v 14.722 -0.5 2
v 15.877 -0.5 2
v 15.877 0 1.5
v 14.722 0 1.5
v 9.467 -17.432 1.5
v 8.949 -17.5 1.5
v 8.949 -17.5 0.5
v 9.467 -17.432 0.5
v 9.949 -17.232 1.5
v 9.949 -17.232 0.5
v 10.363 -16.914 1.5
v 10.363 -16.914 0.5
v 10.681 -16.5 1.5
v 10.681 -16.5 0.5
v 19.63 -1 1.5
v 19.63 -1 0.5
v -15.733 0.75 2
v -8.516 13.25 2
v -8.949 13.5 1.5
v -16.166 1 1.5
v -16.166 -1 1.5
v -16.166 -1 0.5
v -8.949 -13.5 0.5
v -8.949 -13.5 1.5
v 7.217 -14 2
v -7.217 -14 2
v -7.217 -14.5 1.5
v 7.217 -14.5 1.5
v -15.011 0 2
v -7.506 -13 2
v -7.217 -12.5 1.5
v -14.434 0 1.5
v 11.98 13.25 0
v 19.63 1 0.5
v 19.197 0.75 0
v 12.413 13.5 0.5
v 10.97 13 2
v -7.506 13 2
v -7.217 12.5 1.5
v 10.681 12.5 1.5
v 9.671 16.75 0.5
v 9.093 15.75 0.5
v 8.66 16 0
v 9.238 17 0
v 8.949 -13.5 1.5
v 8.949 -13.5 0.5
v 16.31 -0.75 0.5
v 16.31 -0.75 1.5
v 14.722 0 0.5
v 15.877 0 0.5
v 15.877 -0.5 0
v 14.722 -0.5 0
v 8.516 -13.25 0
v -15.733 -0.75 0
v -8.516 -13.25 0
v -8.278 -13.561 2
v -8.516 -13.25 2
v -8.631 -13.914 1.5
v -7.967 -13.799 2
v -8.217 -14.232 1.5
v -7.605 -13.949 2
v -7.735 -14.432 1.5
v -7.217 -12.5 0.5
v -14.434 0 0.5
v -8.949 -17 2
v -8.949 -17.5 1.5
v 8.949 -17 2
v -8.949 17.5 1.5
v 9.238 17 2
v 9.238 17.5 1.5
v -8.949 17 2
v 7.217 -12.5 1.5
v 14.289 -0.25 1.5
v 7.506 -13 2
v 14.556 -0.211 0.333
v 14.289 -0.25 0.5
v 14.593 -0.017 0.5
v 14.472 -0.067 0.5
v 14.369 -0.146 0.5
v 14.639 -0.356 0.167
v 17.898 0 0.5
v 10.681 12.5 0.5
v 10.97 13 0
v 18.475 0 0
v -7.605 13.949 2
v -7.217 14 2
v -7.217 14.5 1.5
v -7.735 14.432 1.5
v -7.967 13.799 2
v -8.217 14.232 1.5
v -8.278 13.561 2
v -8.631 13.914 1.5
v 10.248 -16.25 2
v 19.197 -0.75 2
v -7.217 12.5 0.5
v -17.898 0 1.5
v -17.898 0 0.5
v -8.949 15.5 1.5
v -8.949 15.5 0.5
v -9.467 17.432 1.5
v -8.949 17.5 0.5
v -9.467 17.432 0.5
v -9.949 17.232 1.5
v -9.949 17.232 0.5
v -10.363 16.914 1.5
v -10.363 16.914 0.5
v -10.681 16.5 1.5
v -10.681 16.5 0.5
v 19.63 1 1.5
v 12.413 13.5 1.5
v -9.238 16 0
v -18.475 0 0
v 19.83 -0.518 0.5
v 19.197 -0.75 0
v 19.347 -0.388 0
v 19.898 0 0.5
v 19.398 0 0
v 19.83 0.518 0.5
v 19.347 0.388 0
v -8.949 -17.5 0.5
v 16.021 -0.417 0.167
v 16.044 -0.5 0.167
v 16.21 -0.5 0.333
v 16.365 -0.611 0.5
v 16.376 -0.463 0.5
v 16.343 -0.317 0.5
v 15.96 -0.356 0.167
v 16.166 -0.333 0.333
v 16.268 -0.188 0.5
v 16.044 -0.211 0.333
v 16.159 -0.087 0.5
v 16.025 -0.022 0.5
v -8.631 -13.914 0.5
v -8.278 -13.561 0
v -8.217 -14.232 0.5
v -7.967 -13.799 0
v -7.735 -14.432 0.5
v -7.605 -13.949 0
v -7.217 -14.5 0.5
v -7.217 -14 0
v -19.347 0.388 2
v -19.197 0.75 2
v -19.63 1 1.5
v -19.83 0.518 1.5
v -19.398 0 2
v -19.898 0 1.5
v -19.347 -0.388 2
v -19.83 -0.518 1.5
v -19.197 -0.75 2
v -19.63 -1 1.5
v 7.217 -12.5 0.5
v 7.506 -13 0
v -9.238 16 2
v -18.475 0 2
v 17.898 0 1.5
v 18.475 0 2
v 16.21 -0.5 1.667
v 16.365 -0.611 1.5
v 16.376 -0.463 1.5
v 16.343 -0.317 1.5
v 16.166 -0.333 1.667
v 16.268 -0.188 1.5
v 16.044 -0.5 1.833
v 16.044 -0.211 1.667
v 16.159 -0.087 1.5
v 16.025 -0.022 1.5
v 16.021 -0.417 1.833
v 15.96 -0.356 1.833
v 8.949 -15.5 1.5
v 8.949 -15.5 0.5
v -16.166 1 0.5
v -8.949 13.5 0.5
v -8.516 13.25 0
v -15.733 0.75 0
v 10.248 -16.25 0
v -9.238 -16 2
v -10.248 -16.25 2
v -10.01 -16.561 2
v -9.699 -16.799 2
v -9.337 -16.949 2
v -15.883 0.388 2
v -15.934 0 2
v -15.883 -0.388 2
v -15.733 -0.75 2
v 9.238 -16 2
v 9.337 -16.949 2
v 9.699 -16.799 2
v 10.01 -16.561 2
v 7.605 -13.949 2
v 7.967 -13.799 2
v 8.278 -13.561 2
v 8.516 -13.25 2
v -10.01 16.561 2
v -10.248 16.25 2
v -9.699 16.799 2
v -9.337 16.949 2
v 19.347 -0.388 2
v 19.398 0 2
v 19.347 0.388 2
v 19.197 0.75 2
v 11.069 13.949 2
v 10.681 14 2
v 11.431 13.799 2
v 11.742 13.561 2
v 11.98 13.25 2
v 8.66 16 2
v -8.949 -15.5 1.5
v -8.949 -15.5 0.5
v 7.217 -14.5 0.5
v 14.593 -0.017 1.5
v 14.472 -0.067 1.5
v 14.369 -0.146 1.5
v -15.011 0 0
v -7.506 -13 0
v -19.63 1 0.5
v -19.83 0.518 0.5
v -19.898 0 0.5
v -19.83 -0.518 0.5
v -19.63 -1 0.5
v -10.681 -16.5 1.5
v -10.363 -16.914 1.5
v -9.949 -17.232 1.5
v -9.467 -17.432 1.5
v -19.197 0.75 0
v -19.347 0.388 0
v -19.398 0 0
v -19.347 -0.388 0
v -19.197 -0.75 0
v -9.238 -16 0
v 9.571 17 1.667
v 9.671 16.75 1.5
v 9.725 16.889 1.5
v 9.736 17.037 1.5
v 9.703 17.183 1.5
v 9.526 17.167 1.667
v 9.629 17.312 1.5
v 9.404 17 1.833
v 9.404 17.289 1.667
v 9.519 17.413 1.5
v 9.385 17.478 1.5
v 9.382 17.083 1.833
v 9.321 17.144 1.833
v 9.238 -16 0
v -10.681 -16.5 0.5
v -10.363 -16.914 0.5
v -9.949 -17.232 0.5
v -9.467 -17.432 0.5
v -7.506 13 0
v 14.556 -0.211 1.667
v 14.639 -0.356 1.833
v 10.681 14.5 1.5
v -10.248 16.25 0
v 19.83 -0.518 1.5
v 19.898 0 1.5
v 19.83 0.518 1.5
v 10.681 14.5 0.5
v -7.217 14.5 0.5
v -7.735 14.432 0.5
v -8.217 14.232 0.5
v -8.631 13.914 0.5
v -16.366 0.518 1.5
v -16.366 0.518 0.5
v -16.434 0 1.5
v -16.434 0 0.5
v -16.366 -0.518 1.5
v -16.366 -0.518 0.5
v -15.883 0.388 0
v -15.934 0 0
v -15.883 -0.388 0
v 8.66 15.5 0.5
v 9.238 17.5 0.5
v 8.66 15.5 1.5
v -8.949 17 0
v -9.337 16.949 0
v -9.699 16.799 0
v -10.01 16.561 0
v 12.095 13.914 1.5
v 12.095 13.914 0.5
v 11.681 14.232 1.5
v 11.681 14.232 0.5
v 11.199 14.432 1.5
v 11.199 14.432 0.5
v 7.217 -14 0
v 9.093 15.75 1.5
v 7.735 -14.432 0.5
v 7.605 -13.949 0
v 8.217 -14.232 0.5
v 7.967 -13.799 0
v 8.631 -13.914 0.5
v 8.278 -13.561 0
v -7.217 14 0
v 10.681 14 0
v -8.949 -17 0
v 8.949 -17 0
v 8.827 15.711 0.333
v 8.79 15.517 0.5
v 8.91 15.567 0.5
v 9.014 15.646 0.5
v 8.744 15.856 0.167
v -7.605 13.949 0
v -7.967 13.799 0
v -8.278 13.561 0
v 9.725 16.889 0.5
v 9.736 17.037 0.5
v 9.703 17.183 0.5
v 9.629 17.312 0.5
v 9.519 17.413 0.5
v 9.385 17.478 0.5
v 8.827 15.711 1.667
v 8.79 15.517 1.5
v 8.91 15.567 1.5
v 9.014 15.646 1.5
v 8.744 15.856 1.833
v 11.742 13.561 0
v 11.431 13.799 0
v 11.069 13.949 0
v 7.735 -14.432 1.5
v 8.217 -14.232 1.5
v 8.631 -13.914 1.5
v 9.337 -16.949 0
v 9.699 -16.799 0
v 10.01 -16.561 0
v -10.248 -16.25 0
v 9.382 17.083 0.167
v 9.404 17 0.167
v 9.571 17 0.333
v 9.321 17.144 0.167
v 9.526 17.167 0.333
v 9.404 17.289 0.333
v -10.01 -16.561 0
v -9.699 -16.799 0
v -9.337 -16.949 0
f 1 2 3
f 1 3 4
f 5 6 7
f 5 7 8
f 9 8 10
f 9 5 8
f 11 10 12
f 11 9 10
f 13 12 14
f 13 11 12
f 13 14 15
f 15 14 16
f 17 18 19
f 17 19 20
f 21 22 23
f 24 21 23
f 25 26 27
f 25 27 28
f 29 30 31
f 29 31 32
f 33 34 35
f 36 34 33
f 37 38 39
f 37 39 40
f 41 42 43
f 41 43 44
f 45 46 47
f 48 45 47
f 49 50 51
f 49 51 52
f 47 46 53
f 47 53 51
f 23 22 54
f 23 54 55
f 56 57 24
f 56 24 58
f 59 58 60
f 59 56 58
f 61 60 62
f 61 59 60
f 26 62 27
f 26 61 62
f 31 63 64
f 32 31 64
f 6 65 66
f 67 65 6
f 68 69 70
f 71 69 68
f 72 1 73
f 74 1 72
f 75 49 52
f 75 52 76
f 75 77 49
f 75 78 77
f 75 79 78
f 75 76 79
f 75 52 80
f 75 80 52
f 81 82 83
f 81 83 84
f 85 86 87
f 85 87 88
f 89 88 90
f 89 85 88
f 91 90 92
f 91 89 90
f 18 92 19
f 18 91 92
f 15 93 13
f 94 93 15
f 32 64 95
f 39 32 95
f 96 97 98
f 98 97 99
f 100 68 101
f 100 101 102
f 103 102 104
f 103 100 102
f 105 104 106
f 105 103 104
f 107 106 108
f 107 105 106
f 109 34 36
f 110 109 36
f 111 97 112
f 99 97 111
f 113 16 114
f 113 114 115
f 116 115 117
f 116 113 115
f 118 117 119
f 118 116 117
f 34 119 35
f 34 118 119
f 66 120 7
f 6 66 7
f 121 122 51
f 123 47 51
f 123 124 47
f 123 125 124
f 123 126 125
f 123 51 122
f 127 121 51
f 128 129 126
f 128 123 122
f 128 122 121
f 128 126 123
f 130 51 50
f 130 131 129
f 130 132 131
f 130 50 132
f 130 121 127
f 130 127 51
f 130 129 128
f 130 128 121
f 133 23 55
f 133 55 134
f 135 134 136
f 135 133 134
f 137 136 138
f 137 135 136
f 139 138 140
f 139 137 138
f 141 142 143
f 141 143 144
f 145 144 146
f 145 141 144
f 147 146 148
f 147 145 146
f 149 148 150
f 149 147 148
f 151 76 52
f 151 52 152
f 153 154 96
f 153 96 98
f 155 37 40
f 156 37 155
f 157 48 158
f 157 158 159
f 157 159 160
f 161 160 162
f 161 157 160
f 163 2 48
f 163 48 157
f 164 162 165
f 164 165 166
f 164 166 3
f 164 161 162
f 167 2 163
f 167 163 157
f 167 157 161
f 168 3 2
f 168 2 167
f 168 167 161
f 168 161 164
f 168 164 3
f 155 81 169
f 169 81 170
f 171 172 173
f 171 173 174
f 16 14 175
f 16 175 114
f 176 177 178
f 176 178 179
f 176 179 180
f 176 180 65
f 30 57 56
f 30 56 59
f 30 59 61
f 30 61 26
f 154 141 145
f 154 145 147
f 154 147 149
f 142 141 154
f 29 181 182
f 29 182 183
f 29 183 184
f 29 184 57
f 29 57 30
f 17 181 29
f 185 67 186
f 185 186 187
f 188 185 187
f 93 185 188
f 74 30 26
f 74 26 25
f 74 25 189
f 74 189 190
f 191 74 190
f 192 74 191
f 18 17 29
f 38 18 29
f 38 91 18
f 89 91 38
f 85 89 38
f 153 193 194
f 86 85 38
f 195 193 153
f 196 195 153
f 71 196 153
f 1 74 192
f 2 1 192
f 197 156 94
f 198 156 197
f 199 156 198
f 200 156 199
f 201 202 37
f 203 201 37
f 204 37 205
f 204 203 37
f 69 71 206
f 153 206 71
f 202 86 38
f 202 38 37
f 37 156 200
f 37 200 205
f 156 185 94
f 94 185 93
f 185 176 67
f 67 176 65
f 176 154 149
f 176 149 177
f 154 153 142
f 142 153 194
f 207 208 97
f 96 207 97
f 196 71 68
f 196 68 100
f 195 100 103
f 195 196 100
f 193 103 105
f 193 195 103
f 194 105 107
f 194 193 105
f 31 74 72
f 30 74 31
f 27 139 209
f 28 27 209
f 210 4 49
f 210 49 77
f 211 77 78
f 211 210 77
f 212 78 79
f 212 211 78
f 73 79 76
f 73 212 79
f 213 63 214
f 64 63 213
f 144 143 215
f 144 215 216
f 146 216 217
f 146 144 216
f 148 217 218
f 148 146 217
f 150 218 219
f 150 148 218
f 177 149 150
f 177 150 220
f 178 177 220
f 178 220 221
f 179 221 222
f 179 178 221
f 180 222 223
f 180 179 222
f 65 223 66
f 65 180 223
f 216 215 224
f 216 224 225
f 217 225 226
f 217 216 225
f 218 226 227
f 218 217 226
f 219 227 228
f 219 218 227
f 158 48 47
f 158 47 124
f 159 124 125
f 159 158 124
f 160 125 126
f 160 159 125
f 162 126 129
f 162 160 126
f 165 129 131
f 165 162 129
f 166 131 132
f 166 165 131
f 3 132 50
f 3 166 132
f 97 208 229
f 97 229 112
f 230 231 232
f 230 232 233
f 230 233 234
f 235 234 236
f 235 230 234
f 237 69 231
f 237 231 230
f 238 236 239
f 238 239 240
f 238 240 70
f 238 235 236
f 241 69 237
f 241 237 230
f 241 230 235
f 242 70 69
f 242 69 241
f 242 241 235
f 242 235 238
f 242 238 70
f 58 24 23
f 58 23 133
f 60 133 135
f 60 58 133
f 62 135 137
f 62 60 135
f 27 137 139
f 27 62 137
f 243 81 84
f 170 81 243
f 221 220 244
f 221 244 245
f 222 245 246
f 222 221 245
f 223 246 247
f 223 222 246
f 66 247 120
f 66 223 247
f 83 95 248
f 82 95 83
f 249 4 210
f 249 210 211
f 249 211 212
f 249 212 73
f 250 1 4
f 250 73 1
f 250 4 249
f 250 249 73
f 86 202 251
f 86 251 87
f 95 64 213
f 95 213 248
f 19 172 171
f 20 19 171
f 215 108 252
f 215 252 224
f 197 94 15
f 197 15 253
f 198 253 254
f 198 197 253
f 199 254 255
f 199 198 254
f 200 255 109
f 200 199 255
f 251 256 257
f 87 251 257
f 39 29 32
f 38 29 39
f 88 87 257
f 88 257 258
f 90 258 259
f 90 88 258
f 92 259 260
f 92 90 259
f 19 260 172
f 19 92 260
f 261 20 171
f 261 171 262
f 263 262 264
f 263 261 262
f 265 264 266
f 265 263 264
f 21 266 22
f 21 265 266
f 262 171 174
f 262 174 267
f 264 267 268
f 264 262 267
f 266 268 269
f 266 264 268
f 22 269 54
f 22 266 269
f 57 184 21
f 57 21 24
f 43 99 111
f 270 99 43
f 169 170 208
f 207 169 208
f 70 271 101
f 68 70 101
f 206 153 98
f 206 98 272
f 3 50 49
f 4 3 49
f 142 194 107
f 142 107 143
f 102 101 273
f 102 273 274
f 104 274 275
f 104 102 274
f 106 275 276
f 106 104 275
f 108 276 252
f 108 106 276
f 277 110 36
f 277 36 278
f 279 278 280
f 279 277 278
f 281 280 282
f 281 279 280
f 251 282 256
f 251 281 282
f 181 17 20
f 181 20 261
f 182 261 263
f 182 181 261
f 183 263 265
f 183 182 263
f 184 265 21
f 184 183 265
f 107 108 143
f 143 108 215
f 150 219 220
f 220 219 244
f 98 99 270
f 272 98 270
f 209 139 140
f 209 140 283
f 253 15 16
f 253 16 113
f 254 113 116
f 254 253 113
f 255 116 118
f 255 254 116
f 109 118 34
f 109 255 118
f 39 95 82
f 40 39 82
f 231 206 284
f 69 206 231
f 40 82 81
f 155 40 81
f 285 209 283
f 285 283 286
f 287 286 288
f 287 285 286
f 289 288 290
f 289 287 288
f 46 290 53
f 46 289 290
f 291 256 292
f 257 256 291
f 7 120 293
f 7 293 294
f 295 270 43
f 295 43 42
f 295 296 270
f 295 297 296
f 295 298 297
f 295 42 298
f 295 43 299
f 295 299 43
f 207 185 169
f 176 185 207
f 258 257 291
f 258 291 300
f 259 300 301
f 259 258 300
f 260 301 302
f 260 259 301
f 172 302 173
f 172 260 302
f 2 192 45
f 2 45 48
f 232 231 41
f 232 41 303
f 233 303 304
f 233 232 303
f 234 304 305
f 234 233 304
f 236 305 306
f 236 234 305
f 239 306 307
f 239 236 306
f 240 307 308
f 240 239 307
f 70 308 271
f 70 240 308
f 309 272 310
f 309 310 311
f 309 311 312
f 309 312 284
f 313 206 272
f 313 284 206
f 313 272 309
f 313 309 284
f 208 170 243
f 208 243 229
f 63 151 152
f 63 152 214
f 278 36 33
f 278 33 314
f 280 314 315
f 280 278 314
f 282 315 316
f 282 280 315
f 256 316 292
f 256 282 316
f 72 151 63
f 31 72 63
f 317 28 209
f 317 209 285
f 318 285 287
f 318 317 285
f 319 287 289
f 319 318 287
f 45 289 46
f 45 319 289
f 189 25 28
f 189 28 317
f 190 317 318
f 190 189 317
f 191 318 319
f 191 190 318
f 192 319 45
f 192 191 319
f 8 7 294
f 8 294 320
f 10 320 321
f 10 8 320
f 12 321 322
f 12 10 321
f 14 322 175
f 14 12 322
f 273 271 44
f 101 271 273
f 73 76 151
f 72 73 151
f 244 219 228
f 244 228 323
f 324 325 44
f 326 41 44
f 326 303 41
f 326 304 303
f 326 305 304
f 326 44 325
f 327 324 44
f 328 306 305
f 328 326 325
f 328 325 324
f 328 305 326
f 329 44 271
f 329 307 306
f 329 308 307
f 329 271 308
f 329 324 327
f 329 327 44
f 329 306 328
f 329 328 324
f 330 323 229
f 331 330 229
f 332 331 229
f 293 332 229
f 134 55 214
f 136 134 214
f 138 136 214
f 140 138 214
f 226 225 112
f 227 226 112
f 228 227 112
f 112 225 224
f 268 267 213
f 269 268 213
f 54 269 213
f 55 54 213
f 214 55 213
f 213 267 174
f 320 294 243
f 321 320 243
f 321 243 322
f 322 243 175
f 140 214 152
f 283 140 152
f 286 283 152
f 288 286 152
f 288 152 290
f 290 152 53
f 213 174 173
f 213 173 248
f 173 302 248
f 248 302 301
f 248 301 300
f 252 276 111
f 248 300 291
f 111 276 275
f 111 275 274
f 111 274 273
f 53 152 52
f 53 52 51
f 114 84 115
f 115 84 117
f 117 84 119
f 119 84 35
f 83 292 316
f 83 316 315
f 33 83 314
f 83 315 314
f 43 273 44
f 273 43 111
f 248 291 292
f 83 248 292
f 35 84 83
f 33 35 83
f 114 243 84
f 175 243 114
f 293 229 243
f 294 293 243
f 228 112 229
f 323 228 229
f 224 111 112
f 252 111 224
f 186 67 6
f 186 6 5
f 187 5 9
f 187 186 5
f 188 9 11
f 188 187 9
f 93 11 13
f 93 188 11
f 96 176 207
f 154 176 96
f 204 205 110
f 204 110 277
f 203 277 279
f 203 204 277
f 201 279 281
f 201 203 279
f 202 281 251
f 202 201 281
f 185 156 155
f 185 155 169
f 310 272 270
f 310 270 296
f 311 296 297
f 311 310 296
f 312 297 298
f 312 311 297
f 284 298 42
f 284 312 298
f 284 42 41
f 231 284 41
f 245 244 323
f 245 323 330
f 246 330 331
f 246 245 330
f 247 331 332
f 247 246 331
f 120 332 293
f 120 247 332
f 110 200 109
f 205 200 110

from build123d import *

# Parameters (mm, degrees)
F1_DEPTH = 2
F2_R     = 0.5
F3_R     = 2
F4_SIZE  = 0.49999


# Not quite as in the source:
# - a fillet or chamfer is up to 0.001 mm smaller than in the source, because OpenCascade refuses the exact size


with BuildPart() as f1:
    # F0 (on Top) → F1 (new body)
    with BuildSketch(Plane.XY):
        Polygon((-14.4337567297, 0), (-7.2168783649, 12.5), (7.2168783649, 12.5), (9.5262794416, 12.5), (10.68097998, 12.5), (17.8978583449, 0), (8.9489291724, -15.5), (-8.9489291724, -15.5), (-17.8978583449, 0), (-8.9489291724, 15.5), (8.9489291724, 15.5), (10.1036297108, 17.5), (-10.1036297108, 17.5), (-20.2072594216, 0), (-10.1036297108, -17.5), (10.1036297108, -17.5), (20.2072594216, 0), (11.8356805184, 14.5), (8.3715789032, 14.5), (-8.3715789032, 14.5), (-16.7431578065, 0), (-8.3715789032, -14.5), (8.3715789032, -14.5), (16.7431578065, 0), (14.4337567297, 0), (7.2168783649, -12.5), (-7.2168783649, -12.5), align=None)
    extrude(amount=F1_DEPTH)

    # F2
    f2_edges = [f1.edges().sort_by_distance(p)[0] for p in [
        (16.743158, 0, 1),
        (14.433757, 0, 1),
        (10.10363, 17.5, 1),
        (8.948929, 15.5, 1),
    ]]
    fillet(f2_edges, radius=F2_R)

    # F3
    f3_edges = [f1.edges().sort_by_distance(p)[0] for p in [
        (-10.10363, 17.5, 1),
        (-20.207259, 0, 1),
        (-10.10363, -17.5, 1),
        (10.10363, -17.5, 1),
        (20.207259, 0, 1),
        (11.835681, 14.5, 1),
        (-8.371579, 14.5, 1),
        (-16.743158, 0, 1),
        (-8.371579, -14.5, 1),
        (8.371579, -14.5, 1),
    ]]
    fillet(f3_edges, radius=F3_R)

    # F4 (size 0.5 in the source; OpenCascade refuses exactly that, so slightly less here)
    f4_edges = [f1.edges().sort_by_distance(p)[0] for p in [
        (12.629537, -7.125, 0),
        (8.216878, -14.232051, 0),
        (16.310145, -0.25, 0),
        (0, -14.5, 0),
        (15.299782, 0, 0),
        (-8.216878, -14.232051, 0),
        (14.472432, -0.066987, 0),
        (-12.557368, -7.25, 0),
        (10.753149, -6.375, 0),
        (-16.433757, 0, 0),
        (0, -12.5, 0),
        (-12.557368, 7.25, 0),
        (-10.825318, -6.25, 0),
        (-8.216878, 14.232051, 0),
        (-10.825318, 6.25, 0),
        (1.732051, 14.5, 0),
        (1.732051, 12.5, 0),
        (11.68098, 14.232051, 0),
        (14.289419, 6.25, 0),
        (16.02147, 7.25, 0),
        (13.423394, -7.75, 0),
        (19.897858, 0, 0),
        (0, -15.5, 0),
        (15.155445, -8.75, 0),
        (-13.423394, -7.75, 0),
        (9.948929, -17.232051, 0),
        (-13.423394, 7.75, 0),
        (0, -17.5, 0),
        (-0.144338, 15.5, 0),
        (-9.948929, -17.232051, 0),
        (8.910254, 15.566987, 0),
        (-15.155445, -8.75, 0),
        (9.381942, 16.25, 0),
        (-19.897858, 0, 0),
        (9.670617, 17.25, 0),
        (-15.155445, 8.75, 0),
        (0.144338, 17.5, 0),
        (-9.948929, 17.232051, 0),
        (12.629537, -7.125, 2),
        (8.216878, -14.232051, 2),
        (16.310145, -0.25, 2),
        (0, -14.5, 2),
        (15.299782, 0, 2),
        (-8.216878, -14.232051, 2),
        (14.472432, -0.066987, 2),
        (-12.557368, -7.25, 2),
        (10.753149, -6.375, 2),
        (-16.433757, 0, 2),
        (0, -12.5, 2),
        (-12.557368, 7.25, 2),
        (-10.825318, -6.25, 2),
        (-8.216878, 14.232051, 2),
        (-10.825318, 6.25, 2),
        (1.732051, 14.5, 2),
        (1.732051, 12.5, 2),
        (11.68098, 14.232051, 2),
        (14.289419, 6.25, 2),
        (16.02147, 7.25, 2),
        (13.423394, -7.75, 2),
        (19.897858, 0, 2),
        (0, -15.5, 2),
        (15.155445, -8.75, 2),
        (-13.423394, -7.75, 2),
        (9.948929, -17.232051, 2),
        (-13.423394, 7.75, 2),
        (0, -17.5, 2),
        (-0.144338, 15.5, 2),
        (-9.948929, -17.232051, 2),
        (8.910254, 15.566987, 2),
        (-15.155445, -8.75, 2),
        (9.381942, 16.25, 2),
        (-19.897858, 0, 2),
        (9.670617, 17.25, 2),
        (-15.155445, 8.75, 2),
        (0.144338, 17.5, 2),
        (-9.948929, 17.232051, 2),
    ]]
    chamfer(f4_edges, length=F4_SIZE)


solid = f1.part
